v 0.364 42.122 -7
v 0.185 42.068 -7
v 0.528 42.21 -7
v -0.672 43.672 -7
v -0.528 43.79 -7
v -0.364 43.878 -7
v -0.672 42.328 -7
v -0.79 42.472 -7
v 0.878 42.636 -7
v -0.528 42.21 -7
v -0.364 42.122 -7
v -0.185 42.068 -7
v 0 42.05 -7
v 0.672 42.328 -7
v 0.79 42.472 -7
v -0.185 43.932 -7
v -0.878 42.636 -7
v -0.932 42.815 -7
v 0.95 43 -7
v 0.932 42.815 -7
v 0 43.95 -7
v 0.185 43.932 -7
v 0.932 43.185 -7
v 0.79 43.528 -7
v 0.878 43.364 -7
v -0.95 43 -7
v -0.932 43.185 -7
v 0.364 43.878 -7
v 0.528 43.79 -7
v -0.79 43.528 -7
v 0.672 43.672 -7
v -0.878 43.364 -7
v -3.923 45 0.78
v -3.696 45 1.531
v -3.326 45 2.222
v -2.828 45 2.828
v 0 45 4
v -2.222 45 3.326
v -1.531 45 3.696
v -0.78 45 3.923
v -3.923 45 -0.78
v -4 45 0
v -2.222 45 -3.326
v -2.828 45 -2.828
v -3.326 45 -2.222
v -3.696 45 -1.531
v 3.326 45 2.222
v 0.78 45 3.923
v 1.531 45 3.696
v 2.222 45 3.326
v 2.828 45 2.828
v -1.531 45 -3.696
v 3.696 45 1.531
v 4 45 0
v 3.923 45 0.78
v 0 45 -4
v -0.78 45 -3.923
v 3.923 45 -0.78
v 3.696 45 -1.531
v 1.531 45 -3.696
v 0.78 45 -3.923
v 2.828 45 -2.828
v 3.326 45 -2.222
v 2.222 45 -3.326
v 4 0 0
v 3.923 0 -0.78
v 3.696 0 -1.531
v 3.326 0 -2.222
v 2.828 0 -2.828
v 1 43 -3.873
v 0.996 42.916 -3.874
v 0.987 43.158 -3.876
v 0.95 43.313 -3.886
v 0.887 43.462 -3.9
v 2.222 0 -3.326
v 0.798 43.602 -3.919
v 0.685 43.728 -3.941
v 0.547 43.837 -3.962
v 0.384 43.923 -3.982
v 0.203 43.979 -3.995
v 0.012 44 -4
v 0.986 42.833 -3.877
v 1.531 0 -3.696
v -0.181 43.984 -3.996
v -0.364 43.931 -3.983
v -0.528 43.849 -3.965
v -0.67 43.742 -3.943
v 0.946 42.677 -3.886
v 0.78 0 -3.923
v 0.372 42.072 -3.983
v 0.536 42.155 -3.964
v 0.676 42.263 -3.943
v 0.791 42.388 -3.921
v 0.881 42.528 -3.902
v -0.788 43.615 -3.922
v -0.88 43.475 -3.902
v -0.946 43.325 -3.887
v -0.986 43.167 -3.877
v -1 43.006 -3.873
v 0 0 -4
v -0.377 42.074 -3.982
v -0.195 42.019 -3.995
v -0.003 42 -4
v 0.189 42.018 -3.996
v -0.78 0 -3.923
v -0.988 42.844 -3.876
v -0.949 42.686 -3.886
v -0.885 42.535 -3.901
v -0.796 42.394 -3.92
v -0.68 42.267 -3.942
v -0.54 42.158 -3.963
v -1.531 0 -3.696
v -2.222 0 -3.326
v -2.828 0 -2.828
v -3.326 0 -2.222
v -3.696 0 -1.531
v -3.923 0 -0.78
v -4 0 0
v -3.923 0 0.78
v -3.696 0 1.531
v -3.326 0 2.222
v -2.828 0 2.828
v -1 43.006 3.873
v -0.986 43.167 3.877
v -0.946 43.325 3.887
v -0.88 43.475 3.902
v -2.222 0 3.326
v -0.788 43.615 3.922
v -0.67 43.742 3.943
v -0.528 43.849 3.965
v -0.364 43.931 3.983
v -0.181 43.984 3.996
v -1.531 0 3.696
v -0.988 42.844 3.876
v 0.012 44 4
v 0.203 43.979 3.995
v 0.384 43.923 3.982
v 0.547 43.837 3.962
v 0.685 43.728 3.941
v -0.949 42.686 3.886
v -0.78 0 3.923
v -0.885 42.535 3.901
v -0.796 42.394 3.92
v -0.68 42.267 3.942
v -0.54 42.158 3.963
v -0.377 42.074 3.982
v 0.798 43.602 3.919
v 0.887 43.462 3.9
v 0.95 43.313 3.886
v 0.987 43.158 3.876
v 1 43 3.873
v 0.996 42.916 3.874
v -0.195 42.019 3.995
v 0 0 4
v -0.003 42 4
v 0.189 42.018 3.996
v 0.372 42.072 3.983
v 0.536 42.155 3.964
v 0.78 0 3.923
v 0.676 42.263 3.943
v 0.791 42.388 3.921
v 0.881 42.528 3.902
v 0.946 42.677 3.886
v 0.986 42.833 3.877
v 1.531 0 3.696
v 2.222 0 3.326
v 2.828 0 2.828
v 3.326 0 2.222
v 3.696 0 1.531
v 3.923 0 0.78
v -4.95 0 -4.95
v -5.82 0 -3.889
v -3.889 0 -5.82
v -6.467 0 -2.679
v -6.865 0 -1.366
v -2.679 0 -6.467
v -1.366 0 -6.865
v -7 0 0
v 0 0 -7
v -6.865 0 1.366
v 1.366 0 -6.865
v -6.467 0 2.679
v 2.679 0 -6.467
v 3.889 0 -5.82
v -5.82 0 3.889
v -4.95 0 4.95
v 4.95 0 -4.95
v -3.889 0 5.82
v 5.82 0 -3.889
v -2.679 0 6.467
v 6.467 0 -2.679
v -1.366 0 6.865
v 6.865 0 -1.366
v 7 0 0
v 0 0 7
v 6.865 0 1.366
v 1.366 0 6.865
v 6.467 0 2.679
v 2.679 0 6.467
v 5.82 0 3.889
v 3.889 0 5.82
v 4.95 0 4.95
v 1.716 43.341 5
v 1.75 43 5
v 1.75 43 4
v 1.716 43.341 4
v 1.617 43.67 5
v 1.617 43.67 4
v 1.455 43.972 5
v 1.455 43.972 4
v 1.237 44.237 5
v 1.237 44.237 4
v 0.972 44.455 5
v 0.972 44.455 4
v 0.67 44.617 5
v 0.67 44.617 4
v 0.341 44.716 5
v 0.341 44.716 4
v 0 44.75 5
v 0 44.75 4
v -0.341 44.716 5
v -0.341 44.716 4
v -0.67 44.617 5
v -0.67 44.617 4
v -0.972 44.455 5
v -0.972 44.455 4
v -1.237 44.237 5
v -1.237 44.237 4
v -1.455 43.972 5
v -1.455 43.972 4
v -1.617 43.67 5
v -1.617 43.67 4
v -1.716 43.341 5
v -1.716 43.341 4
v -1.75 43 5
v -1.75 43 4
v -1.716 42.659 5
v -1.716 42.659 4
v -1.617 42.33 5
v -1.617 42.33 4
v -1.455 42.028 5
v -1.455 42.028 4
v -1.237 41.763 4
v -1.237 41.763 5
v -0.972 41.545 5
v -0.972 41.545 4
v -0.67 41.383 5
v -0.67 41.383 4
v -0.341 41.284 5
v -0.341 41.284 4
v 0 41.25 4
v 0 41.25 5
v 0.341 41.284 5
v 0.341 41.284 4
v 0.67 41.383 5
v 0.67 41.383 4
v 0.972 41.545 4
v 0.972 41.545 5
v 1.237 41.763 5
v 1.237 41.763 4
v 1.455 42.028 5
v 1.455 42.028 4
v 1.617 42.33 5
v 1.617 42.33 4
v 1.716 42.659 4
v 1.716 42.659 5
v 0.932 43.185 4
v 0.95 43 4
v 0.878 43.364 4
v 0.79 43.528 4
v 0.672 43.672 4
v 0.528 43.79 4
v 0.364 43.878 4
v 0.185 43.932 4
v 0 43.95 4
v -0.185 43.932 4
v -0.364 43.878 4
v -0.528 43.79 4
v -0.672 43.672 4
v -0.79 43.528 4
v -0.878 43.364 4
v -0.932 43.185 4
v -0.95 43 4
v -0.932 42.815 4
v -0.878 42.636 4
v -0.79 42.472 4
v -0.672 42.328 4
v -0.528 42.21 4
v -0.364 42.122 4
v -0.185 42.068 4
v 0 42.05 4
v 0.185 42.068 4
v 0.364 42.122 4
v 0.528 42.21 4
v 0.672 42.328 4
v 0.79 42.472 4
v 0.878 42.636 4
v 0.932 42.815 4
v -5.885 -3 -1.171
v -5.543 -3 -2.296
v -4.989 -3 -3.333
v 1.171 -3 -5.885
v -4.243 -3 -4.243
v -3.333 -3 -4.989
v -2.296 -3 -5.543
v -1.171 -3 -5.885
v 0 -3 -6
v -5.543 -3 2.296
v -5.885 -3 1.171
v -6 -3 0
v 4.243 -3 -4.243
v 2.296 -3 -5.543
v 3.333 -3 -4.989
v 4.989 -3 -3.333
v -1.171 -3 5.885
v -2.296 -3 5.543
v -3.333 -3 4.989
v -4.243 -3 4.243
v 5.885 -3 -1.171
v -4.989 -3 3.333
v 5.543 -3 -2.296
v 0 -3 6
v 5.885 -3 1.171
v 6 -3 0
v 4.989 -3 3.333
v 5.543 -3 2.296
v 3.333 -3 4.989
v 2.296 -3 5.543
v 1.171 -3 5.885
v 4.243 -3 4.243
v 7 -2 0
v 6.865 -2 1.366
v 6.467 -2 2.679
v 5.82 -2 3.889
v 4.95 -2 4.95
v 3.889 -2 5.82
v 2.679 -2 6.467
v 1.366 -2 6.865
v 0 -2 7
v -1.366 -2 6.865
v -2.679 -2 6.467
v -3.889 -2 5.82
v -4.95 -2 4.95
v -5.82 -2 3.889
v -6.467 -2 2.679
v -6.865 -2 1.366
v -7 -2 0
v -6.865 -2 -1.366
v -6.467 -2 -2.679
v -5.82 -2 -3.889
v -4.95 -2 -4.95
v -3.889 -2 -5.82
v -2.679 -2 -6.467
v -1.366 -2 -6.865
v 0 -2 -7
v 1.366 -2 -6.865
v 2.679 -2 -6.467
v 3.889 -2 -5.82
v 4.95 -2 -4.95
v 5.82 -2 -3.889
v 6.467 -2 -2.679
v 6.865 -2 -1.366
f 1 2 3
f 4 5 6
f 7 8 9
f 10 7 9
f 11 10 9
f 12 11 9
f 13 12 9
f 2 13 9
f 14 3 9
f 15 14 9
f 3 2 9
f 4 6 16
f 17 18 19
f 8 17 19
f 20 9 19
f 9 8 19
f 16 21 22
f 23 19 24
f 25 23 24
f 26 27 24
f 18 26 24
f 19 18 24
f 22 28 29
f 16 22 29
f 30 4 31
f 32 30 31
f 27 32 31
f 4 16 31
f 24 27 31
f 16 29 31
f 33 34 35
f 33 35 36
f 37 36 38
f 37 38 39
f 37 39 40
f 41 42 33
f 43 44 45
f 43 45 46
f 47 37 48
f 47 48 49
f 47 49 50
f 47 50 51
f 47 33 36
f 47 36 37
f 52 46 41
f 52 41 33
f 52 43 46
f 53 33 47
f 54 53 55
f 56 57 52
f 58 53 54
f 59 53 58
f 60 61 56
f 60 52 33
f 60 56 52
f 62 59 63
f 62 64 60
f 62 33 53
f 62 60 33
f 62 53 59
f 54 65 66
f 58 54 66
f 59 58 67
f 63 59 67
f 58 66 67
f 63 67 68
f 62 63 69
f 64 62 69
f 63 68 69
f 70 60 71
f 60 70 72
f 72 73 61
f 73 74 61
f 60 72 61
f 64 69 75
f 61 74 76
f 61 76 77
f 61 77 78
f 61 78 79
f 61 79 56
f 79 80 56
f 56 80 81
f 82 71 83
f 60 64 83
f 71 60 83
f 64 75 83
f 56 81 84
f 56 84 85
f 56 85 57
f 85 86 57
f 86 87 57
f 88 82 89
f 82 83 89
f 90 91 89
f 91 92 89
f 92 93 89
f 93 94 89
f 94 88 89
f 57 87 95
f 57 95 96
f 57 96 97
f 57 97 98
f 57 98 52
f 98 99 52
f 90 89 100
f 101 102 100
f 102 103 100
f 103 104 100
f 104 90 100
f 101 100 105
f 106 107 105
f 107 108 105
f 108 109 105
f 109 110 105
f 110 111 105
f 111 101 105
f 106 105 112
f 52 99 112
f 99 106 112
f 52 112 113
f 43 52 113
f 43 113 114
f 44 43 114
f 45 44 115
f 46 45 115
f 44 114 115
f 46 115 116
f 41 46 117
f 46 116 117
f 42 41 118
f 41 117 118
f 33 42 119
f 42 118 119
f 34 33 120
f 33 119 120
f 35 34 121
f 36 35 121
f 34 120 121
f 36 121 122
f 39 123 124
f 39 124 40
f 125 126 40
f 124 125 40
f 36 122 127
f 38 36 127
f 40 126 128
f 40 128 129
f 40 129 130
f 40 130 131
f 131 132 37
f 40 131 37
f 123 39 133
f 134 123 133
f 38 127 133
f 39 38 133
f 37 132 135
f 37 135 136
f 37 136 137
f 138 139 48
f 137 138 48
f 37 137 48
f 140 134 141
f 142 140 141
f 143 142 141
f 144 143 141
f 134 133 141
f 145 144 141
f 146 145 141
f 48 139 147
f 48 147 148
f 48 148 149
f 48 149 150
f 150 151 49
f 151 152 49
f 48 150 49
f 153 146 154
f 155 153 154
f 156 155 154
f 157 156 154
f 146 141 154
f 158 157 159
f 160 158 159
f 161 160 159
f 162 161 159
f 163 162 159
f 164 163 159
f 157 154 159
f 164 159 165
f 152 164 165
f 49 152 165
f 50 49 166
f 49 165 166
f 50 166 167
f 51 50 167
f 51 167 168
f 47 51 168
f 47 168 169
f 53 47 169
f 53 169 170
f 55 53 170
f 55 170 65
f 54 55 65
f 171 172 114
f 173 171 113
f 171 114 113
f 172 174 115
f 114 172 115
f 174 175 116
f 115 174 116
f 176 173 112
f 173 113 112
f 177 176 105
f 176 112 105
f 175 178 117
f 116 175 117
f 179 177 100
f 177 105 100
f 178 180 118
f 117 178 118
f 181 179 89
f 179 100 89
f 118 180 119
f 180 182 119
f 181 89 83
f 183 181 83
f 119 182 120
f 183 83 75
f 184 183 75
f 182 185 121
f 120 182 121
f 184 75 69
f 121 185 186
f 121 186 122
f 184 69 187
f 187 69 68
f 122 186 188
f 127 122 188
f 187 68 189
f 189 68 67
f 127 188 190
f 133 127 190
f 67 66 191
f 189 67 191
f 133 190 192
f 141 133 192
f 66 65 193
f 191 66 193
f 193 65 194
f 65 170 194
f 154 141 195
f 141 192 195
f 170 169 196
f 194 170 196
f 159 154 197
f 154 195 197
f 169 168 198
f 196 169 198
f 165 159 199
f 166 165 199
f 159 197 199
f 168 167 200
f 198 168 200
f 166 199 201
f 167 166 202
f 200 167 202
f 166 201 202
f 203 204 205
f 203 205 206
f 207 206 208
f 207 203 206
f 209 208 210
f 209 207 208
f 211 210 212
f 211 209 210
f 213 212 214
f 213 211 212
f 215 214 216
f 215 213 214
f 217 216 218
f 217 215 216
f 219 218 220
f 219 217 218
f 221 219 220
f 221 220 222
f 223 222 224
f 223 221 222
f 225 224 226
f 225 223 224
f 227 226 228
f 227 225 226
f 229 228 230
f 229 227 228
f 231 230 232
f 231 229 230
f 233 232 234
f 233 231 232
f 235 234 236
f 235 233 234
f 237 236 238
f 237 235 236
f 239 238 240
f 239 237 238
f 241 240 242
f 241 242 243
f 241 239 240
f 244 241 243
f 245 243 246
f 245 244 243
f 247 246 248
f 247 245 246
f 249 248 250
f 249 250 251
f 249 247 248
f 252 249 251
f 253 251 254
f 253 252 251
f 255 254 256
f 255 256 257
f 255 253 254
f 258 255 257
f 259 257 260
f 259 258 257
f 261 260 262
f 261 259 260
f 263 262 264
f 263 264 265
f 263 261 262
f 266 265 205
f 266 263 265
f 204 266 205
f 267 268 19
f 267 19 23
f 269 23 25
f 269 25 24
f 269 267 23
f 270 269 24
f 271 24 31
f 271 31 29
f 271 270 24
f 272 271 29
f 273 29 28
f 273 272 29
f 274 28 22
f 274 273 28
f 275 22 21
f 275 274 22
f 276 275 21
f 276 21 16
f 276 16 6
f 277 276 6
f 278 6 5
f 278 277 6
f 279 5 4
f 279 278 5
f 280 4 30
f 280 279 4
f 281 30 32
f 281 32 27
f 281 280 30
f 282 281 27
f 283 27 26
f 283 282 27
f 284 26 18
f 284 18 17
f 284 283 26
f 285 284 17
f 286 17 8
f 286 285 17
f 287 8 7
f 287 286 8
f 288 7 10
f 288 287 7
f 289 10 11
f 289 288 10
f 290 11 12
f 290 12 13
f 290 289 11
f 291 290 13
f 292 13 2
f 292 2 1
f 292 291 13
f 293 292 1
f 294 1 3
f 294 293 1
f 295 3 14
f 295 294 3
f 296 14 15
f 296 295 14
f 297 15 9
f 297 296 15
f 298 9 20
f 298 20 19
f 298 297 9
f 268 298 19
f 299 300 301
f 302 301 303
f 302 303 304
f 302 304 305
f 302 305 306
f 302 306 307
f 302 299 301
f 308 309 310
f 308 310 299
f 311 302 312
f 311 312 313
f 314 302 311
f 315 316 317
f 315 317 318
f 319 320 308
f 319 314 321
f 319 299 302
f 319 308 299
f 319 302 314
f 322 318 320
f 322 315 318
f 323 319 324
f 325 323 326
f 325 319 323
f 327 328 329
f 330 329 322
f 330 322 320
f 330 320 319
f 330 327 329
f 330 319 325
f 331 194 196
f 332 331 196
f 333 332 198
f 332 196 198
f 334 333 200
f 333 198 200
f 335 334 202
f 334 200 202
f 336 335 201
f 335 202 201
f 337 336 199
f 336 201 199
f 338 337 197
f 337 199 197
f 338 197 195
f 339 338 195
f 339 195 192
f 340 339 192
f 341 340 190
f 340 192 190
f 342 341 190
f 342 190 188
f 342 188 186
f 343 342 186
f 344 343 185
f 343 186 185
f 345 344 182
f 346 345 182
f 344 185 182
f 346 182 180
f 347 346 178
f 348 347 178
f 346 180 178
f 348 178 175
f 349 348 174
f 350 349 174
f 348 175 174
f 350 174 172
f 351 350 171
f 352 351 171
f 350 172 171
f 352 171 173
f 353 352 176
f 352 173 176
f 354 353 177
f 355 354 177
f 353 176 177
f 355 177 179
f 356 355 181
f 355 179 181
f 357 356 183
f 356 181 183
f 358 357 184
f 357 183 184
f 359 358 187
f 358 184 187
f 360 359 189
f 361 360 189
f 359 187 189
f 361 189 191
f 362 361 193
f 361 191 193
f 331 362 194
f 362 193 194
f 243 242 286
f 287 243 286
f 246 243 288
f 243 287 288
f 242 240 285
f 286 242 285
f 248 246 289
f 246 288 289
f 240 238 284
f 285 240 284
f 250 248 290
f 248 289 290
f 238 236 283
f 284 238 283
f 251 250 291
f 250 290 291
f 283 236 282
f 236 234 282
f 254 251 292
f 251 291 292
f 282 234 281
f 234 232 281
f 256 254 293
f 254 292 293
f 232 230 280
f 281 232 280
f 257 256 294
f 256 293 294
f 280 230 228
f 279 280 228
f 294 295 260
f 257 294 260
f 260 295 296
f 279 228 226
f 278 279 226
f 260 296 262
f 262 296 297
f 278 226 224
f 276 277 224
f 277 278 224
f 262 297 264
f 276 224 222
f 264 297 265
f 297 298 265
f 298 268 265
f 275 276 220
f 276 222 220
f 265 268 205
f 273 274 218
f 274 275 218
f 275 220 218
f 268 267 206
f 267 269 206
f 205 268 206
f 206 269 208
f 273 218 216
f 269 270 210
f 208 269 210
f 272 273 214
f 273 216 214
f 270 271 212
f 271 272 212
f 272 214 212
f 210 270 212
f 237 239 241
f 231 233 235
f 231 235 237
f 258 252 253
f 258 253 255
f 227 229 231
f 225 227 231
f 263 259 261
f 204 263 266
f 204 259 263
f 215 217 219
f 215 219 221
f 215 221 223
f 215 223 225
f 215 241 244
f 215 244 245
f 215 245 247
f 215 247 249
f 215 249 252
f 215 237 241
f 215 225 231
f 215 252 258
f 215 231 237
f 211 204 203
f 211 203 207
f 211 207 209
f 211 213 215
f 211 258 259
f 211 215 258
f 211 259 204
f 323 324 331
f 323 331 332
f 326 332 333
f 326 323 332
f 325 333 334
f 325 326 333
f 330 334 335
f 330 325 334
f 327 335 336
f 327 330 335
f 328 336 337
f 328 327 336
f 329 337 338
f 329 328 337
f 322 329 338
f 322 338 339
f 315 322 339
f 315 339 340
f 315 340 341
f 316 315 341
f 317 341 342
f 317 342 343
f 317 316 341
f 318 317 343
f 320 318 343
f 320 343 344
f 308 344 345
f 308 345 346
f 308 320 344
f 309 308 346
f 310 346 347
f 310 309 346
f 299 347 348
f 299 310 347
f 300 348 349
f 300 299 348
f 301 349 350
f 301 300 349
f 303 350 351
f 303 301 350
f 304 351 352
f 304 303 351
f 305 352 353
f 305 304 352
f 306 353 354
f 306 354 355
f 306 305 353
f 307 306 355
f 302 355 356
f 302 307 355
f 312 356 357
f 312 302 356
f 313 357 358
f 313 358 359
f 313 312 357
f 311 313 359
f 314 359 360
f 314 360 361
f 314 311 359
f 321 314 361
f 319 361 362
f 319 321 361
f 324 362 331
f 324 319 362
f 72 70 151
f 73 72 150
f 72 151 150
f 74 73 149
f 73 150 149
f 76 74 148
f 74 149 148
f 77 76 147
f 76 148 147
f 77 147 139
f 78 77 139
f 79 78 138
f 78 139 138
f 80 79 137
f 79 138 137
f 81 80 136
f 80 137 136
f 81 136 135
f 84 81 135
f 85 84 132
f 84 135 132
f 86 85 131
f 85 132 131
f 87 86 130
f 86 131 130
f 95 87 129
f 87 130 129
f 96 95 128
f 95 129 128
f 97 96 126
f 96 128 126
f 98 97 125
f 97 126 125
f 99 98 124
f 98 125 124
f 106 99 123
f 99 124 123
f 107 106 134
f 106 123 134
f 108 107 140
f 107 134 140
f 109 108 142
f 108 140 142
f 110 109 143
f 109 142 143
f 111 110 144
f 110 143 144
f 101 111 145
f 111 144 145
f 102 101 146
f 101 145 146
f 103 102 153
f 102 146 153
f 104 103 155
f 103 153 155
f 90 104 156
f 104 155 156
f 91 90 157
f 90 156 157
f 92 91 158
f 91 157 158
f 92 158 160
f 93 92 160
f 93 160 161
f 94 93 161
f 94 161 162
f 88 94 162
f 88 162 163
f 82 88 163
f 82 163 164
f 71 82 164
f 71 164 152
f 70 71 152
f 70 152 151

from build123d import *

# Parameters (mm, degrees)
SKETCH1_R                = 4
BOSS_EXTRUDE1_DEPTH      = 45
SKETCH2_R                = 7
BOSS_EXTRUDE2_DEPTH      = 3
CHAMFER1_SIZE            = 1
SKETCH3_R                = 1
CUT_EXTRUDE1_DEPTH       = 10
CUT_EXTRUDE1_DEPTH_BACK  = 10
SKETCH4_R                = 0.95
BOSS_EXTRUDE3_DEPTH      = 5
BOSS_EXTRUDE3_DEPTH_BACK = 7
SKETCH5_R                = 1.75
BOSS_EXTRUDE4_DEPTH      = 1


with BuildPart() as part:
    # Sketch1 → Boss-Extrude1 (new body)
    with BuildSketch(Plane(origin=(0, 0, 0), x_dir=(1, 0, 0), z_dir=(0, 1, 0))):
        Circle(SKETCH1_R)
    extrude(amount=BOSS_EXTRUDE1_DEPTH)

    # Sketch2 → Boss-Extrude2 (add)
    with BuildSketch(Plane.XZ):
        Circle(SKETCH2_R)
    extrude(amount=BOSS_EXTRUDE2_DEPTH)

    # Chamfer1
    chamfer1_edges = [part.edges().sort_by_distance(p)[0] for p in [
        (-7, -3, 0),
    ]]
    chamfer(chamfer1_edges, length=CHAMFER1_SIZE)

    # Sketch3 → Cut-Extrude1 (cut, two sides)
    with BuildSketch(Plane.XY) as cut_extrude1_sk:
        with Locations((0, 43)):
            Circle(SKETCH3_R)
    extrude(amount=CUT_EXTRUDE1_DEPTH, mode=Mode.SUBTRACT)
    extrude(cut_extrude1_sk.sketch, amount=-CUT_EXTRUDE1_DEPTH_BACK, mode=Mode.SUBTRACT)


with BuildPart() as body_2:
    # Sketch4 → Boss-Extrude3 (new body, two sides)
    with BuildSketch(Plane.XY) as boss_extrude3_sk:
        with Locations((0, 43)):
            Circle(SKETCH4_R)
    extrude(amount=BOSS_EXTRUDE3_DEPTH)
    extrude(boss_extrude3_sk.sketch, amount=-BOSS_EXTRUDE3_DEPTH_BACK)

    # Sketch5 → Boss-Extrude4 (add)
    with BuildSketch(Plane.XY.offset(5)):
        with Locations((0, 43)):
            Circle(SKETCH5_R)
    extrude(amount=-BOSS_EXTRUDE4_DEPTH)


solid = Compound([part.part, body_2.part])
